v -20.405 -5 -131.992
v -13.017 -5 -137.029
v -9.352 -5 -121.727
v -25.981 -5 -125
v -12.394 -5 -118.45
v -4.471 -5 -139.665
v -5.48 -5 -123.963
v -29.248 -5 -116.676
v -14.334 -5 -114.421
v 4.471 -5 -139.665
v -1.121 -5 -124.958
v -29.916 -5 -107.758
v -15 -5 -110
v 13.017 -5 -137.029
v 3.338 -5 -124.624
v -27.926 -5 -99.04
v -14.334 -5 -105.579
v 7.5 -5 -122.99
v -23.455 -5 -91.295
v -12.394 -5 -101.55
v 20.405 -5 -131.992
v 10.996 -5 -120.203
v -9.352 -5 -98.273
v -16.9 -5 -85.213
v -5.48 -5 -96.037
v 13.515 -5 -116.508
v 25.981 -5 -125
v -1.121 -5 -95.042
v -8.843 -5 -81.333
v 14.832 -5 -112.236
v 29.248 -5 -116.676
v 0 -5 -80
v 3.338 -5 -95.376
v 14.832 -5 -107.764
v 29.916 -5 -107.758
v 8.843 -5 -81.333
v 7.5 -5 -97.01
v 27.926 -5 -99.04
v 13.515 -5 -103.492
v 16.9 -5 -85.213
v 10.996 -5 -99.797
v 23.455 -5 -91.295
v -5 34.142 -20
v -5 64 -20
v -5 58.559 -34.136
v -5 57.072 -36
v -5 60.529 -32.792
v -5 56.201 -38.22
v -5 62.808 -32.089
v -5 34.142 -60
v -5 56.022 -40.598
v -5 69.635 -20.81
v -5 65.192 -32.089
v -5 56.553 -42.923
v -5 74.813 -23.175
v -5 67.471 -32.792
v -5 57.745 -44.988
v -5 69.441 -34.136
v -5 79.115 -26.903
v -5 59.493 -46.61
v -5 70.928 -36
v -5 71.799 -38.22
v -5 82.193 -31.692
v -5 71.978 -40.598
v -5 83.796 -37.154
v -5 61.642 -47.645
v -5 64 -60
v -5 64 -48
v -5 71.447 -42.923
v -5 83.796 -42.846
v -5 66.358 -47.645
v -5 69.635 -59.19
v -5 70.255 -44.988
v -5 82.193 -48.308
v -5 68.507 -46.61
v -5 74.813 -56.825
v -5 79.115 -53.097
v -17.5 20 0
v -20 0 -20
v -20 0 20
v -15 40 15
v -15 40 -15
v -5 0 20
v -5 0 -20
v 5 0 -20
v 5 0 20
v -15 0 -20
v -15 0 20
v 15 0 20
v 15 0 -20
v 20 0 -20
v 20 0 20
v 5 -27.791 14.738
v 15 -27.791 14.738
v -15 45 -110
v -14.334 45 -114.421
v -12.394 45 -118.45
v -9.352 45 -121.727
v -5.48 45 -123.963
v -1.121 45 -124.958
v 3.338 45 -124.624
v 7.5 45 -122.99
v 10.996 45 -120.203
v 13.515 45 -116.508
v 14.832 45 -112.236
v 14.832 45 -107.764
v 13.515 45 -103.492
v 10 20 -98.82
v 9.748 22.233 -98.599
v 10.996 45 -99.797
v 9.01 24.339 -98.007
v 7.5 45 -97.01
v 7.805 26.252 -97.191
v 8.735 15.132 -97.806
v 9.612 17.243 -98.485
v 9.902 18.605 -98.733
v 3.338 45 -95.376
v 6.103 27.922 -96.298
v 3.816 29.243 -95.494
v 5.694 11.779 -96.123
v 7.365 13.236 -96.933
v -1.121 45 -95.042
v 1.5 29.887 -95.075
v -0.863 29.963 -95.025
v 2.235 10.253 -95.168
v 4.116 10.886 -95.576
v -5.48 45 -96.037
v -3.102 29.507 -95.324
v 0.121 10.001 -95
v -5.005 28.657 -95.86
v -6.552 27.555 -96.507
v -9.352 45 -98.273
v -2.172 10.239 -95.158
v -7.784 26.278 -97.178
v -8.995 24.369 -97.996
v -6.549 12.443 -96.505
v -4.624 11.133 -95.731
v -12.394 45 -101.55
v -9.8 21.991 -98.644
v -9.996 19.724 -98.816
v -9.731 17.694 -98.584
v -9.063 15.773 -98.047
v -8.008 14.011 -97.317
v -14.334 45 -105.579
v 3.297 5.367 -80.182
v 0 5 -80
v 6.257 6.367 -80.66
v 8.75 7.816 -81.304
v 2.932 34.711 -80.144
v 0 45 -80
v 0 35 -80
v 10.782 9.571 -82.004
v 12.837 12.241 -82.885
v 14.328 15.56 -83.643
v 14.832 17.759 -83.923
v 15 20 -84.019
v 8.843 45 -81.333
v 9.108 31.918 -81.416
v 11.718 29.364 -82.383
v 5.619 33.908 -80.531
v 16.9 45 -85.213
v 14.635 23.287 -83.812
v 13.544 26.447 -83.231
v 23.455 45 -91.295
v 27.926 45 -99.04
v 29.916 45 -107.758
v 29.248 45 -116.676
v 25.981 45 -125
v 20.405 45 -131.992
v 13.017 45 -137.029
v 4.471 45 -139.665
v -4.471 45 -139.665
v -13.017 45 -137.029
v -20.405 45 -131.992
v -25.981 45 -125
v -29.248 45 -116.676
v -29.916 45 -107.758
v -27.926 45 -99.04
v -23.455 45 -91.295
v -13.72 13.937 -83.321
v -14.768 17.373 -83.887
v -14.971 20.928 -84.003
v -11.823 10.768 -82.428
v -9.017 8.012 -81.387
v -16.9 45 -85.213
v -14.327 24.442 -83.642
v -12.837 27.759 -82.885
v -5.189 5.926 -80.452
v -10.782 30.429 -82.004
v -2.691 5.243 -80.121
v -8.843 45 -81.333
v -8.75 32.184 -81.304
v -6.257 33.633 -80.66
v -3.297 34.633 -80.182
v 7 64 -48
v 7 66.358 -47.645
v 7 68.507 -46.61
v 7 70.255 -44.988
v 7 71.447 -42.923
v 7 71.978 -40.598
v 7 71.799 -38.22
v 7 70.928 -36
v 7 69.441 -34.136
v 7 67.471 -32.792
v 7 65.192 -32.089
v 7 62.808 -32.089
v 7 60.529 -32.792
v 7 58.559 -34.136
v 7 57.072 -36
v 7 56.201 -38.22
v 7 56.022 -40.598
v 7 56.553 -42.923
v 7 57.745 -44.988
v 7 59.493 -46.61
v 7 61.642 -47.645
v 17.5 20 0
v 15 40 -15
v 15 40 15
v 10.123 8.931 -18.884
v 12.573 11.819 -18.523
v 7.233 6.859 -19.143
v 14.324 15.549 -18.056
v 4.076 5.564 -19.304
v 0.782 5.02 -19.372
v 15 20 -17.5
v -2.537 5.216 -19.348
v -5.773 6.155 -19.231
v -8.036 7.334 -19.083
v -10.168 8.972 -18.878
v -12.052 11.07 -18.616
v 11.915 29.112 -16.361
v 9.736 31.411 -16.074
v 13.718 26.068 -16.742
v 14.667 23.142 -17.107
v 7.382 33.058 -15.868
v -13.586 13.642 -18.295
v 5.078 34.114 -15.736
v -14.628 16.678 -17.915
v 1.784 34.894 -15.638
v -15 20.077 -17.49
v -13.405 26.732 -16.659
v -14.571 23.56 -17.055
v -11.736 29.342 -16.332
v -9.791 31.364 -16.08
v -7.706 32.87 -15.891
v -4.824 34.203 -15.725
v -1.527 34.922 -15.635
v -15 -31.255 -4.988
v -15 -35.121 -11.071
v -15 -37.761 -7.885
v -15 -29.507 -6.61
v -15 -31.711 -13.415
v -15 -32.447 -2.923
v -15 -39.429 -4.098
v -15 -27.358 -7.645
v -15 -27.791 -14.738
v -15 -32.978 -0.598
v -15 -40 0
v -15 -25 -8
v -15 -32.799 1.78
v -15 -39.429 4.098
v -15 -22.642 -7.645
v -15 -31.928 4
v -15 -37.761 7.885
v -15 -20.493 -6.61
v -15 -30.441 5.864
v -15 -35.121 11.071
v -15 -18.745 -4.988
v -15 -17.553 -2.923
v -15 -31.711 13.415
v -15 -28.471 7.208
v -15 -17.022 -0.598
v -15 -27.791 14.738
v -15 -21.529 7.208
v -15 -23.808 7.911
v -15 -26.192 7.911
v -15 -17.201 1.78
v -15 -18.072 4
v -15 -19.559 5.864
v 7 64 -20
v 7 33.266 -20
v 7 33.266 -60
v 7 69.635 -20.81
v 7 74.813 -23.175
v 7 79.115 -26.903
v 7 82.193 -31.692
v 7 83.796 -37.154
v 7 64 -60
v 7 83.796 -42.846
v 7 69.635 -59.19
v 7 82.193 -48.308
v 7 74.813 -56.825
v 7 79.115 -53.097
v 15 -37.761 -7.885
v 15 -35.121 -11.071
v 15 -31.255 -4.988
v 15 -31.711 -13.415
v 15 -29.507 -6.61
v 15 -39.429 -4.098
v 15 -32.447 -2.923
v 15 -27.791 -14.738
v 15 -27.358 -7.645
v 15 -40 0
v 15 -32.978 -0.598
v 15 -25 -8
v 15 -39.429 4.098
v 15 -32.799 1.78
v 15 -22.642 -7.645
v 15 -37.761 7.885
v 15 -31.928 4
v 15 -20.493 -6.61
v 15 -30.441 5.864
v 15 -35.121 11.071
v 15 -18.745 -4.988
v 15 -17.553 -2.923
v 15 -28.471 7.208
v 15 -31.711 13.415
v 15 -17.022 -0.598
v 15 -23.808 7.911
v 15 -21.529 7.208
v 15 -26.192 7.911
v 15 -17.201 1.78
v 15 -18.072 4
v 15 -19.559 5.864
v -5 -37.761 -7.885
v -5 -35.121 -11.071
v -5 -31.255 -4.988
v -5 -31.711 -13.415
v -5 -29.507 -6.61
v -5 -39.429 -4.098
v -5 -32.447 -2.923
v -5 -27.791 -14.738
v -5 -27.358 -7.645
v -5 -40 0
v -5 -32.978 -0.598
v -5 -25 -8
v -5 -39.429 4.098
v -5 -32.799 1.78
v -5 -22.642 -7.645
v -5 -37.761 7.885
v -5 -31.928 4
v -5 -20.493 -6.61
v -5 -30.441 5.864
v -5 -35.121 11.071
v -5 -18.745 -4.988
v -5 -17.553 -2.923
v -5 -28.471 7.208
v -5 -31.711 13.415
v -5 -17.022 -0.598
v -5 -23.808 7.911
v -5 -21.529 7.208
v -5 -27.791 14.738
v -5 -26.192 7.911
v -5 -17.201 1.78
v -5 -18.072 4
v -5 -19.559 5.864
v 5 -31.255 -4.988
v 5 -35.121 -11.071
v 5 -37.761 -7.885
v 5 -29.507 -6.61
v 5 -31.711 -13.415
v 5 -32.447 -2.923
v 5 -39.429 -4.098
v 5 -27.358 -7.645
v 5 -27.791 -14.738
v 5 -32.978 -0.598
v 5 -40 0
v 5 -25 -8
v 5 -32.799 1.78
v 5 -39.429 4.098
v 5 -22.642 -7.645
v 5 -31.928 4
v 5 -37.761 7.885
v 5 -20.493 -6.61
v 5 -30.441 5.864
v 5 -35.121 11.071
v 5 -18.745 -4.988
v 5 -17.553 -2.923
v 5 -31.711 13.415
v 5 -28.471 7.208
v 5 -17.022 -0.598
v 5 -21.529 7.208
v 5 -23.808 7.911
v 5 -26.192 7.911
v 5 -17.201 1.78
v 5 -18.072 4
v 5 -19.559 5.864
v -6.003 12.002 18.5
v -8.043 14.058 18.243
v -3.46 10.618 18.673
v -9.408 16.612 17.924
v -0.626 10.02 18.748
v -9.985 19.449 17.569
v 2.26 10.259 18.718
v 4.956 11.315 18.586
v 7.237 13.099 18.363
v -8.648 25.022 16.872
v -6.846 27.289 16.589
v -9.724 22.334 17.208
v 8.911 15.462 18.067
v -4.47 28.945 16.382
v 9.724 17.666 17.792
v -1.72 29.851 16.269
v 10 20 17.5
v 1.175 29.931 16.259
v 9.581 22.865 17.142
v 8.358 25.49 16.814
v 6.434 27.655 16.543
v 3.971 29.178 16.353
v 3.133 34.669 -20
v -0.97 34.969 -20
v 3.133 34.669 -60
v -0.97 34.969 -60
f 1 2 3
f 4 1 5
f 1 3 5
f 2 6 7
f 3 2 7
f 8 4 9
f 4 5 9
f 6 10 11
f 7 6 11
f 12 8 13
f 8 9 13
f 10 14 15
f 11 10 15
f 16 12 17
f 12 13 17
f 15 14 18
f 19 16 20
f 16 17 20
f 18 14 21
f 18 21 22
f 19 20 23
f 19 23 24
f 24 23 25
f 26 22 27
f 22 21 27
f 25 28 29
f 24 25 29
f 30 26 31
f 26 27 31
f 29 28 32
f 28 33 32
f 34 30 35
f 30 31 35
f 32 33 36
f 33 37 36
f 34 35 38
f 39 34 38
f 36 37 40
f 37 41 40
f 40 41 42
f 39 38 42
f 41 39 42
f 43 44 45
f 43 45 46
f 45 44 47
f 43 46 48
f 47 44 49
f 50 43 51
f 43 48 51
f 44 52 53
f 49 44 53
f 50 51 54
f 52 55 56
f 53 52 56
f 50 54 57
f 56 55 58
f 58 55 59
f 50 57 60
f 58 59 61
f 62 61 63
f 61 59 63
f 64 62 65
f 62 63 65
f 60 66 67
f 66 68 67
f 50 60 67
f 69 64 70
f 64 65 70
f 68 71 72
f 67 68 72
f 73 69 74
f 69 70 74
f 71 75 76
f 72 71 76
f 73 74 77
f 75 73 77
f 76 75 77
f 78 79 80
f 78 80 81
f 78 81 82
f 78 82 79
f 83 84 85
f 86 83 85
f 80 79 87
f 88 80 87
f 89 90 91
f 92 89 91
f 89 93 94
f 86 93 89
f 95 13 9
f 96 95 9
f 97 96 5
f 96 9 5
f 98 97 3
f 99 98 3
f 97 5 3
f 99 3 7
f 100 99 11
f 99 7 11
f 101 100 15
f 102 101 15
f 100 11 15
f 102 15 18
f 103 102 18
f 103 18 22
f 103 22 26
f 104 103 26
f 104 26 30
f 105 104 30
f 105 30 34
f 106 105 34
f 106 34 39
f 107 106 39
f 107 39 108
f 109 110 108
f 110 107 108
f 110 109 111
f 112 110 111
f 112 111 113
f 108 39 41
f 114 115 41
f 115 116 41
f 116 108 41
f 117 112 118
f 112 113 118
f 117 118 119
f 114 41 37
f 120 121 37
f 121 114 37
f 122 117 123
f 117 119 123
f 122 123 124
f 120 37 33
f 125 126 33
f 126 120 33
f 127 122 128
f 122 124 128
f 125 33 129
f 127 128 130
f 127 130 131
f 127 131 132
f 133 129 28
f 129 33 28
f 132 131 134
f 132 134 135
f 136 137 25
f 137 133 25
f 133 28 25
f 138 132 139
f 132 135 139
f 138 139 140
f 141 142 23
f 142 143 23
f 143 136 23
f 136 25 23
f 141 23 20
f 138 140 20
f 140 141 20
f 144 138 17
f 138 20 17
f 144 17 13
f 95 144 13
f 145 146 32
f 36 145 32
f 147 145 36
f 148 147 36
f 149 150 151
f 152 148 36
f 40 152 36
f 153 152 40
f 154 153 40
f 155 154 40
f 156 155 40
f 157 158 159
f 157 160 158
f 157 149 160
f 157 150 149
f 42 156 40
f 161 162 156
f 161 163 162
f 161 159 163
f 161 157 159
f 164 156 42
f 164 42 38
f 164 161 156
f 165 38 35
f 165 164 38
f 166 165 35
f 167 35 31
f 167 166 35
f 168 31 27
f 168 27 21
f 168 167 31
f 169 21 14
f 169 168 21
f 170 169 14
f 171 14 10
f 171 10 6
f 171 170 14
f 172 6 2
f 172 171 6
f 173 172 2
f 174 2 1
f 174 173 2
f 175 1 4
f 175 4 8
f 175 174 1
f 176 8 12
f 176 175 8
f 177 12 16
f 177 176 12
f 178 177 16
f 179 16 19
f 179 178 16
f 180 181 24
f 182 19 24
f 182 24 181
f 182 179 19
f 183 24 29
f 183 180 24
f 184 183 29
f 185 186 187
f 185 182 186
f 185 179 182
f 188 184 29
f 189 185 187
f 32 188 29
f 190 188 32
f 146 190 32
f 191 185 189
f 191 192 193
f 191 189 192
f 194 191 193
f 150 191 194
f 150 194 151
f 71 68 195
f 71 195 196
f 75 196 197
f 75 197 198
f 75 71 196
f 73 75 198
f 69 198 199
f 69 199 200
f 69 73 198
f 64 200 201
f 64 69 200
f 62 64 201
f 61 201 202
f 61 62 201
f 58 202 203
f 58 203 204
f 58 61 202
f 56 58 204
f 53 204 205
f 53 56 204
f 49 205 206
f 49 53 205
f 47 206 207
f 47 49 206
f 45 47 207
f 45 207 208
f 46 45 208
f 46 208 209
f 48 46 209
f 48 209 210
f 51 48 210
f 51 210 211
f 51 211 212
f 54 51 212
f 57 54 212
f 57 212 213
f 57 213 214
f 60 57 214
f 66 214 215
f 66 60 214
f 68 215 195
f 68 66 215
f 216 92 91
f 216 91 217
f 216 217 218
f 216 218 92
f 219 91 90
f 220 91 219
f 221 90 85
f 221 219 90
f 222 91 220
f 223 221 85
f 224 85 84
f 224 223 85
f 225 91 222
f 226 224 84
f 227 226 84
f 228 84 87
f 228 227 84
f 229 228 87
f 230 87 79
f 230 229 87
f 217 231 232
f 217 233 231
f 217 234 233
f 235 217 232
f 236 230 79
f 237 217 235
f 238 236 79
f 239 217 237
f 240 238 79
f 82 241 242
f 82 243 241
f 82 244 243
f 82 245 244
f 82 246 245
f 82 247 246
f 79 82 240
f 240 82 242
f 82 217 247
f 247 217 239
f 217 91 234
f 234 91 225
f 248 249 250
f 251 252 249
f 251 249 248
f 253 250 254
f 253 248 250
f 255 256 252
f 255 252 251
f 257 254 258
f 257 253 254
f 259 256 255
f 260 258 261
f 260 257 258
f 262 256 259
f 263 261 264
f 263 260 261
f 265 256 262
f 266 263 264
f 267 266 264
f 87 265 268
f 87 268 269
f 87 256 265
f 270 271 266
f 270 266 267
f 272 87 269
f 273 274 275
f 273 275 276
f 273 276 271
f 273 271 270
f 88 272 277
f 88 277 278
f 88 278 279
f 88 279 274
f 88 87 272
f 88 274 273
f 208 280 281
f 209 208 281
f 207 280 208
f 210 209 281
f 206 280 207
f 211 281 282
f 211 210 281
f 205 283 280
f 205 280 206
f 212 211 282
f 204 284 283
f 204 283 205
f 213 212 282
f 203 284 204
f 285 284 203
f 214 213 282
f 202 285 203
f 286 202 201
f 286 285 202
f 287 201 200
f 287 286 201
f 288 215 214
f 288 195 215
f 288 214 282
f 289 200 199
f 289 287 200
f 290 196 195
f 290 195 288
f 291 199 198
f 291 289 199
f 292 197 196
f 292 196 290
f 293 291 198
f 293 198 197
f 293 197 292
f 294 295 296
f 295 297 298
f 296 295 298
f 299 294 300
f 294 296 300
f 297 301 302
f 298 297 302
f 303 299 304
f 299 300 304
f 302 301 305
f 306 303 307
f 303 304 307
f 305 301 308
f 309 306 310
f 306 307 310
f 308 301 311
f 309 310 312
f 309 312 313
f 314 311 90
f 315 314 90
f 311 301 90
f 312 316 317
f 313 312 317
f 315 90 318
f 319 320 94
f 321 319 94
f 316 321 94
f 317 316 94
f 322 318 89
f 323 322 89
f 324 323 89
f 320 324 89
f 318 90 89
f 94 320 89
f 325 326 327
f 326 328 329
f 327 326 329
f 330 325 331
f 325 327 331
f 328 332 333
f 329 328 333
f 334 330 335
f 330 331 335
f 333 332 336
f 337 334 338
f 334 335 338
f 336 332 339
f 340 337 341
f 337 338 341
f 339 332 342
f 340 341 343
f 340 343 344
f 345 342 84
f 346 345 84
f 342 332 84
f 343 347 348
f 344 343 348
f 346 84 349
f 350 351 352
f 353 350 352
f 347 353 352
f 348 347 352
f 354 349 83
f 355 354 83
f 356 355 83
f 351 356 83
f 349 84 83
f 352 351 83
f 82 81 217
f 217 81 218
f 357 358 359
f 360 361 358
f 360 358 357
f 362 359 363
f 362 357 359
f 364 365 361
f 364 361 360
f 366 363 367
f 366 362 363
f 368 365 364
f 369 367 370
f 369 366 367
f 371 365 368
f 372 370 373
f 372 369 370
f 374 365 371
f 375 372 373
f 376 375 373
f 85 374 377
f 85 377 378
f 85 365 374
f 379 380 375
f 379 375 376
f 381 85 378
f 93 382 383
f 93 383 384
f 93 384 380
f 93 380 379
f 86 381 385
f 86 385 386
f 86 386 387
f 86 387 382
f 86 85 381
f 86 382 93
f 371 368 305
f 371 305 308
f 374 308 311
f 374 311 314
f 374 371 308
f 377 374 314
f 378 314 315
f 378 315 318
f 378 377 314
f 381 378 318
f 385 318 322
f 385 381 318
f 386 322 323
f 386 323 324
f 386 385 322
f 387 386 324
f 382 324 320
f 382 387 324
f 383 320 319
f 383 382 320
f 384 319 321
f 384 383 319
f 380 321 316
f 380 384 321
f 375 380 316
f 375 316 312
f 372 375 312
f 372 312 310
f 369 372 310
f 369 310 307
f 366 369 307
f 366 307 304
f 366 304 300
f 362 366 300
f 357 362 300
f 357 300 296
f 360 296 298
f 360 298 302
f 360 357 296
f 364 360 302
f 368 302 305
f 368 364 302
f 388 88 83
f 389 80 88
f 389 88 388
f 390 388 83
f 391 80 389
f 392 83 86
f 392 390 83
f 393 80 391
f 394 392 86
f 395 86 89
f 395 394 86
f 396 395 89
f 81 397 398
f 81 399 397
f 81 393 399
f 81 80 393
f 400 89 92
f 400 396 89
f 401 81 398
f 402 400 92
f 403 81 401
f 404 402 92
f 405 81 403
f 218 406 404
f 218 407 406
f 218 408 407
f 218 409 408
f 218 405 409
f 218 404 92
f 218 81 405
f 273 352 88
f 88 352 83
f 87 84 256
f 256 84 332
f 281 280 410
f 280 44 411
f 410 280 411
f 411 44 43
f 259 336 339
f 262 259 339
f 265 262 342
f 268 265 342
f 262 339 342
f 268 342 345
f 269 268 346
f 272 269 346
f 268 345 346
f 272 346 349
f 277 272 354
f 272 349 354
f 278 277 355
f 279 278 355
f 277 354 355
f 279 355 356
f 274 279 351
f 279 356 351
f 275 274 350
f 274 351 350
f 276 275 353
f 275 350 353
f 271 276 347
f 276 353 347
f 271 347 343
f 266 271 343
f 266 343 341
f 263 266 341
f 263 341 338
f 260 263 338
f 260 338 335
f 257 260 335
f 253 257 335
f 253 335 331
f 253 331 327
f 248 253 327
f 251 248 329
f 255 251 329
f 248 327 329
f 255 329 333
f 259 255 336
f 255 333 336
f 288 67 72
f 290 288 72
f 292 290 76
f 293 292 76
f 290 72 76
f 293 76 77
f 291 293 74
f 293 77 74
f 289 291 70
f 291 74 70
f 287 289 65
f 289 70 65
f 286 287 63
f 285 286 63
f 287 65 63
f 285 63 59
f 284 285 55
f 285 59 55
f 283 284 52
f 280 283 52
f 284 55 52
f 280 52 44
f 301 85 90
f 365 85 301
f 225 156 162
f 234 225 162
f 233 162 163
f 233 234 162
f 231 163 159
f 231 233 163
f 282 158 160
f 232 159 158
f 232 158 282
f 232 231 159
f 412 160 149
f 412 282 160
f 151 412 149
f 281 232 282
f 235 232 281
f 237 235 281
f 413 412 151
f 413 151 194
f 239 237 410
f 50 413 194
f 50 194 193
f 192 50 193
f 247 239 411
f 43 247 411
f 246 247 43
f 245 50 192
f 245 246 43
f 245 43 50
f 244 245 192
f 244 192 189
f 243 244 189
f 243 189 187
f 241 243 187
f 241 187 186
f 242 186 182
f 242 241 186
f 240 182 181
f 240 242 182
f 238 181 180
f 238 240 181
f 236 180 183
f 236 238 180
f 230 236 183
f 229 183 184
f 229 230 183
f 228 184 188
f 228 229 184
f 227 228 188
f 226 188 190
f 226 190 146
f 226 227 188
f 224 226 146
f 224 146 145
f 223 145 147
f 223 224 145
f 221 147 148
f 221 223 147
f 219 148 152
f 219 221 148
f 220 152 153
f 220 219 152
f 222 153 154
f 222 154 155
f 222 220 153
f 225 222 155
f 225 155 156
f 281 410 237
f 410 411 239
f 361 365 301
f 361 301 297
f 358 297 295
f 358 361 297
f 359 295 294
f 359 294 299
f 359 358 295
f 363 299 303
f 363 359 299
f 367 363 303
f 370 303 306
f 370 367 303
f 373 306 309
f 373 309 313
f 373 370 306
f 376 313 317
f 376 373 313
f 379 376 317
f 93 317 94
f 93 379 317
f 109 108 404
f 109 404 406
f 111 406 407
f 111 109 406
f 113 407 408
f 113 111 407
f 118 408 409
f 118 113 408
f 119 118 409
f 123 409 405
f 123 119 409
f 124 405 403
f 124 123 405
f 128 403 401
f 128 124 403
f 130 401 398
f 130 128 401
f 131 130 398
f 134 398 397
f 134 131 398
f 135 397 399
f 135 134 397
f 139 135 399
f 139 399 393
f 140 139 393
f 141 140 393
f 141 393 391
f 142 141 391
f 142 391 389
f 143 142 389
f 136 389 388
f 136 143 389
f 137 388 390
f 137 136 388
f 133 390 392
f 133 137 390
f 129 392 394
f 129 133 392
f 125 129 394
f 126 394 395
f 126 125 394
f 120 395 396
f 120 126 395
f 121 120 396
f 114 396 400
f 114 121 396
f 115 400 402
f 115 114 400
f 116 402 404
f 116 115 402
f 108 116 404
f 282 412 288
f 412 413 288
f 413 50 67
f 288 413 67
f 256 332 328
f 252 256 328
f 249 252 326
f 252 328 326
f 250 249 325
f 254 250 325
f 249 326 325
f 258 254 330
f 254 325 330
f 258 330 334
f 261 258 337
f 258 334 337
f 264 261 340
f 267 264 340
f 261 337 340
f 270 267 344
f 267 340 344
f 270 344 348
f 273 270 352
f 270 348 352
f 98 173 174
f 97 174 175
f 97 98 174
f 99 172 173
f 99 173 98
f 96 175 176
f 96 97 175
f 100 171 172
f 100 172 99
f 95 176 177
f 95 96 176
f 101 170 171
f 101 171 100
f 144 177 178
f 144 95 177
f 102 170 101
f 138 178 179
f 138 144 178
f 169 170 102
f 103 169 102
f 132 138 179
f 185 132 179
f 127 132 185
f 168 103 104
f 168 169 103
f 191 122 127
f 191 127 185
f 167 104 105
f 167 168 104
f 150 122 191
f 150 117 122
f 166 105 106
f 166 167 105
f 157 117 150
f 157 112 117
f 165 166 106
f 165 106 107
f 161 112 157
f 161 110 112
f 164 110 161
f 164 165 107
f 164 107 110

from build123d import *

# Parameters (mm, degrees)
SKETCH1_W                      = 40
SKETCH1_H                      = 40
BOSS_EXTRUDE1_DEPTH            = 40
BOSS_EXTRUDE1_TAPER            = 7.125
SKETCH2_R                      = 30
BOSS_EXTRUDE2_DEPTH            = 25
BOSS_EXTRUDE3_REACH            = 152.083
BOSS_EXTRUDE3_END_RADIUS       = 30
SKETCH3_R                      = 15
BOSS_EXTRUDE4_START            = -5
SKETCH4_R                      = 8
BOSS_EXTRUDE4_DEPTH            = 12
BOSS_EXTRUDE5_START            = 5
SKETCH5_R                      = 8
BOSS_EXTRUDE5_DEPTH            = 10
CUT_EXTRUDE1_REACH             = 168
SKETCH8_R                      = 10
CUT_EXTRUDE1_DIRECTION_2_DEPTH = 100
HOLE1_D                        = 30


with BuildPart() as part:
    # Sketch1 → Boss-Extrude1 (new body)
    with BuildSketch(Plane(origin=(0, 0, 0), x_dir=(1, 0, 0), z_dir=(0, 1, 0))):
        Rectangle(SKETCH1_W, SKETCH1_H)
    extrude(amount=BOSS_EXTRUDE1_DEPTH, taper=BOSS_EXTRUDE1_TAPER)



with BuildPart() as body_2:
    # Sketch2 → Boss-Extrude2 (new, symmetric)
    with BuildSketch(Plane(origin=(0, 20, 0), x_dir=(1, 0, 0), z_dir=(0, 1, 0))):
        with Locations(Location((0, 110, 0), (0, 0, 270))):
            Circle(SKETCH2_R)
    extrude(amount=BOSS_EXTRUDE2_DEPTH, both=True)


with BuildPart() as part_1:
    add(part.part)

    add(body_2.part)  # Boss-Extrude3 merges body 2
    # Boss-Extrude3: up to this cylinder (the profile starts outside it)
    boss_extrude3_end = Plane(origin=(0, 20, -110), z_dir=(0, -1, 0)) * Cylinder(BOSS_EXTRUDE3_END_RADIUS, 365.166, mode=Mode.PRIVATE)
    # Sketch3 → Boss-Extrude3 (add, up to the surface)
    with BuildSketch(Plane.XY, mode=Mode.PRIVATE) as boss_extrude3_sk1:
        with Locations((0, 20)):
            Circle(SKETCH3_R)
    boss_extrude3_tool1 = extrude(boss_extrude3_sk1.sketch, amount=-BOSS_EXTRUDE3_REACH, mode=Mode.PRIVATE) - boss_extrude3_end
    add(boss_extrude3_tool1.solids().sort_by_distance((0, 20, 0))[0])

    # Sketch4 → Boss-Extrude4 (add)
    with BuildSketch(Plane(origin=(0, 0, 0), x_dir=(0, 0, -1), z_dir=(1, 0, 0)).offset(BOSS_EXTRUDE4_START)):
        with BuildLine():
            Line((20, 64), (20, 20))
            Line((20, 20), (60, 20))
            Line((60, 20), (60, 64))
            ThreePointArc((60, 64), (40, 84), (20, 64))
        make_face()
        with Locations((40, 64)):
            Circle(SKETCH4_R, mode=Mode.SUBTRACT)
    extrude(amount=BOSS_EXTRUDE4_DEPTH)

    # Sketch5 → Boss-Extrude5 (add)
    with BuildSketch(Plane(origin=(0, 0, 0), x_dir=(0, 0, -1), z_dir=(1, 0, 0)).offset(BOSS_EXTRUDE5_START)):
        with BuildLine():
            Line((-20, 0), (20, 0))
            Line((20, 0), (14.738148017, -27.790518414))
            ThreePointArc((14.738148017, -27.790518414), (0, -40), (-14.738148017, -27.790518414))
            Line((-14.738148017, -27.790518414), (-20, 0))
        make_face()
        with Locations((0, -25)):
            Circle(SKETCH5_R, mode=Mode.SUBTRACT)
    boss_extrude5 = extrude(amount=BOSS_EXTRUDE5_DEPTH)

    # Mirror1: Boss-Extrude5 across plane
    add(boss_extrude5.mirror(Plane(origin=(0, 0, 0), x_dir=(0, 0, 1), z_dir=(1, 0, 0))))

    # Cut-Extrude1: up to this plane
    cut_extrude1_end = Plane(origin=(-20, 0, 20), z_dir=(0, 0.1240344514504856, 0.9922779121059669))
    # Sketch8 → Cut-Extrude1 (cut, up to the surface)
    with BuildSketch(Plane.XY, mode=Mode.PRIVATE) as cut_extrude1_sk1:
        with Locations((0, 20)):
            Circle(SKETCH8_R)
    cut_extrude1_tool1 = split(extrude(cut_extrude1_sk1.sketch, amount=CUT_EXTRUDE1_REACH, mode=Mode.PRIVATE), bisect_by=cut_extrude1_end, keep=Keep.BOTH, mode=Mode.PRIVATE)
    add(cut_extrude1_tool1.solids().sort_by_distance((0, 20, 0))[0], mode=Mode.SUBTRACT)

    # Sketch8 → Cut-Extrude1 direction 2 (cut)
    with BuildSketch(Plane.XY):
        with Locations((0, 20)):
            Circle(SKETCH8_R)
    extrude(amount=-CUT_EXTRUDE1_DIRECTION_2_DEPTH, mode=Mode.SUBTRACT)

    # Hole1 (through all)
    with Locations(Plane(origin=(0, 45, 0), x_dir=(1, 0, 0), z_dir=(0, 1, 0))):
        with Locations((0, 110)):
            Hole(HOLE1_D / 2)


solid = part_1.part
